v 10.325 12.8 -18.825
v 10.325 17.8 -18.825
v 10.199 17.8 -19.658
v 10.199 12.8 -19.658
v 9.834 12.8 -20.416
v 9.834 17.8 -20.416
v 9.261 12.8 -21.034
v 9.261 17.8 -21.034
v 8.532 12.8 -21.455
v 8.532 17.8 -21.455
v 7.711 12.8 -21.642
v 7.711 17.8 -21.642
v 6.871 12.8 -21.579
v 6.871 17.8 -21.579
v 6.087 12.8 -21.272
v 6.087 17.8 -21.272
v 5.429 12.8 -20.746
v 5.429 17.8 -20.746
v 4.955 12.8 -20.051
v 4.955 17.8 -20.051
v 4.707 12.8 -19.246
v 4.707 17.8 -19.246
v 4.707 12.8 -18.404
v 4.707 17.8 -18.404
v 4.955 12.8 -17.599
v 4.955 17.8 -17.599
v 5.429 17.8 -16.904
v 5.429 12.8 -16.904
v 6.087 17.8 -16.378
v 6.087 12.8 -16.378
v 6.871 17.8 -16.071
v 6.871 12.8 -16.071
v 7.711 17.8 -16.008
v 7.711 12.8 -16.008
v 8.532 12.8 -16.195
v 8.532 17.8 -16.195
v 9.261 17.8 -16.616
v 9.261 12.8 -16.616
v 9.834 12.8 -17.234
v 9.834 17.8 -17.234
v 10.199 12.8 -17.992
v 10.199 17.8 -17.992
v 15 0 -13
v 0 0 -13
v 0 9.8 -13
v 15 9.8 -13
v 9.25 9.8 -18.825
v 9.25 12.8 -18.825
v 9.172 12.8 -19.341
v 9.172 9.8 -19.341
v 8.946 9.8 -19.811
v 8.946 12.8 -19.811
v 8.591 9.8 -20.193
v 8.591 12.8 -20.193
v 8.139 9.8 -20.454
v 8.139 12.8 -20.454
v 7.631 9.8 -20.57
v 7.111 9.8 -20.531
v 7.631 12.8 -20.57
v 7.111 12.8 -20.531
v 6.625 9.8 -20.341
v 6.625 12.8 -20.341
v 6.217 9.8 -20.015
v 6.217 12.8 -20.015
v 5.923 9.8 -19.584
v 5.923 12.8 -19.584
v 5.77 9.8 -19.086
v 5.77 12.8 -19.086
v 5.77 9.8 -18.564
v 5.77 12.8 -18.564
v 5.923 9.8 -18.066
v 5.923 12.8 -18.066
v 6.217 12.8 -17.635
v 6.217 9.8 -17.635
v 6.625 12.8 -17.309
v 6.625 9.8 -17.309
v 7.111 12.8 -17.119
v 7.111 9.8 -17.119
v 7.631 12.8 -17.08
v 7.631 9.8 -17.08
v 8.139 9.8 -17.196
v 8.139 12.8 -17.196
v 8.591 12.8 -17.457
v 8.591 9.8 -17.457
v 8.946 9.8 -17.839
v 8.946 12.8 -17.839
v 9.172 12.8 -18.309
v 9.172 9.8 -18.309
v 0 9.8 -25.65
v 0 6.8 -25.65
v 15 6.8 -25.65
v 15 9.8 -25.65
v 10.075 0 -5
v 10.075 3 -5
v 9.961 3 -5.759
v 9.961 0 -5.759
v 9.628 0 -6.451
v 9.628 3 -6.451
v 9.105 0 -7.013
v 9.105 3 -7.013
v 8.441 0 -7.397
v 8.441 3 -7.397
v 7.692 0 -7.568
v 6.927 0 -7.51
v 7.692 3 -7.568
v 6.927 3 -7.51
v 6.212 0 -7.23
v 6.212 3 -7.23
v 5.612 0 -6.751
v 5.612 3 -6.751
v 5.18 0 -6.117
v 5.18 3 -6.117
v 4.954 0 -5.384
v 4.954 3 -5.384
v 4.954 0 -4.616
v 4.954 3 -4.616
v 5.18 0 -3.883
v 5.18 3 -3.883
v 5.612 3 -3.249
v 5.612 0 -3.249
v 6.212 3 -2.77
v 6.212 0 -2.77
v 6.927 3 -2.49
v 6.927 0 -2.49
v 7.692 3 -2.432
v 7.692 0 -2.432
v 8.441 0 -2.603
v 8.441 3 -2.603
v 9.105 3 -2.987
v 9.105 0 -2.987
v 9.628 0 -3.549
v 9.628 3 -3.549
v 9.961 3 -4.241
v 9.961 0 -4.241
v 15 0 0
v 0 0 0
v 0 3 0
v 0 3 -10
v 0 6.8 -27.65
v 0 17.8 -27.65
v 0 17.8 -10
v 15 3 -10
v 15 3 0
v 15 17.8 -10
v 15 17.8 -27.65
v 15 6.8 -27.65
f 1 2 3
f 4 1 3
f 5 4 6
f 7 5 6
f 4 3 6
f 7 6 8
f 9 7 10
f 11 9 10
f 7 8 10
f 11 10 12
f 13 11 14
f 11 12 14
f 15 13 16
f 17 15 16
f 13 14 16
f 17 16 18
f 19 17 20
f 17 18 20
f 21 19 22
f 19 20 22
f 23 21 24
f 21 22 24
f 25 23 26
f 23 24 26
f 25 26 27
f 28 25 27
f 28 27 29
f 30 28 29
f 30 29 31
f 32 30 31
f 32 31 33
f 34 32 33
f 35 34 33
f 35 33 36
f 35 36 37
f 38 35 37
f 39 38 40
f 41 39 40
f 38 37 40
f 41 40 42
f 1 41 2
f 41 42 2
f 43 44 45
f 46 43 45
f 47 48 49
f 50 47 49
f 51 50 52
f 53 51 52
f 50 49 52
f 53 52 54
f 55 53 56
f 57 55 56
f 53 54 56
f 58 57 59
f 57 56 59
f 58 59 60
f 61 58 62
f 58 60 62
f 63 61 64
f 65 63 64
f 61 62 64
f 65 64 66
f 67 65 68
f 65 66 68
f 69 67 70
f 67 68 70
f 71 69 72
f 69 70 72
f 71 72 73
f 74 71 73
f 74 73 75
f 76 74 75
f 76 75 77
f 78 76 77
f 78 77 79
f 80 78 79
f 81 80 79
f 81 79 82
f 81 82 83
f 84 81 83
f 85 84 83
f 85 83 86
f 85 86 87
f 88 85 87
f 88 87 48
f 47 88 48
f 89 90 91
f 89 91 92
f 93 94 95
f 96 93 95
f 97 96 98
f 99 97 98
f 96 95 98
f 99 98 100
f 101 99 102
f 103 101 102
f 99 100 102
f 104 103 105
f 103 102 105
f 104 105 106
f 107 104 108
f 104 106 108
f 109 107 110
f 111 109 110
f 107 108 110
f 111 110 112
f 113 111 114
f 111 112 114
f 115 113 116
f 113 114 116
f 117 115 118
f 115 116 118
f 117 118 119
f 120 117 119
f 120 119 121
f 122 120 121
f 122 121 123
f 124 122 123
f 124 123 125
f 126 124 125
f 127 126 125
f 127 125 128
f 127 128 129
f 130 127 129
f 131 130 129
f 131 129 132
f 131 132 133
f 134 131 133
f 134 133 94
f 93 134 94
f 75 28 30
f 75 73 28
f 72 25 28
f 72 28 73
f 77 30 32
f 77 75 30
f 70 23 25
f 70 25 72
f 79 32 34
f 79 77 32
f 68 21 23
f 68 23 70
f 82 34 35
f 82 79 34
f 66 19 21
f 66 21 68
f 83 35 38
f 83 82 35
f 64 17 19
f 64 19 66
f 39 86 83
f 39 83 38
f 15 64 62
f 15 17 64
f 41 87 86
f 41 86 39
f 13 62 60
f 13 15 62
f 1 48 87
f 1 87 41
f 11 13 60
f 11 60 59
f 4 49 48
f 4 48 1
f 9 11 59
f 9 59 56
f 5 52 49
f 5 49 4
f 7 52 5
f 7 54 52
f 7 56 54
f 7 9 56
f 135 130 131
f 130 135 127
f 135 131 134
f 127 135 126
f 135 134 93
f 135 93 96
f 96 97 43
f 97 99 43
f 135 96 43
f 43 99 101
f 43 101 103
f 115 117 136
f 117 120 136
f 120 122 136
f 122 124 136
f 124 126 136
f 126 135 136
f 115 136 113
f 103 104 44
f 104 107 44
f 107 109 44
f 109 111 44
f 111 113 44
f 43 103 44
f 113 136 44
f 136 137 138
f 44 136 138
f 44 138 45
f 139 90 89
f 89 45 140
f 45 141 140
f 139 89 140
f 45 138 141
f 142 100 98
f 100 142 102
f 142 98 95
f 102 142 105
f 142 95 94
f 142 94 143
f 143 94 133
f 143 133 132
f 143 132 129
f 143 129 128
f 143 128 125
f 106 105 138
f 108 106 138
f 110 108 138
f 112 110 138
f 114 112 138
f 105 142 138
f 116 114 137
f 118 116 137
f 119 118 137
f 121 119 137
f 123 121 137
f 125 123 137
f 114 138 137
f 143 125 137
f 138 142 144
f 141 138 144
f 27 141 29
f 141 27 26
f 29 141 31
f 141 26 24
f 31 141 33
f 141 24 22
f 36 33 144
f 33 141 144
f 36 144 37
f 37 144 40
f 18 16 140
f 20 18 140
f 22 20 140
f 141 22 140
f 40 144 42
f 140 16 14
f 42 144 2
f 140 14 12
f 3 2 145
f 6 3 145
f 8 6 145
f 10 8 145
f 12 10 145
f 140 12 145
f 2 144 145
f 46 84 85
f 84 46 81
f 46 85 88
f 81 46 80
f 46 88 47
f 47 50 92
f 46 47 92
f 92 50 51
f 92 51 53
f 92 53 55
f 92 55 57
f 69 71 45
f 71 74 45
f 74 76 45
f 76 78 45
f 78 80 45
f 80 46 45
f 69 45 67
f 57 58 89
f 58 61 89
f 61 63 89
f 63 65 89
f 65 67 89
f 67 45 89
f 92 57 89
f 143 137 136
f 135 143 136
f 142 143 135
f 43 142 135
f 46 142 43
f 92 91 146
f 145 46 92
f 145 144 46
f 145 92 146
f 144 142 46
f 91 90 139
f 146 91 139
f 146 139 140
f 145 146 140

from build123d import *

# Parameters (mm, degrees)
SALIENTE_EXTRUIR1_DEPTH = 15
CROQUIS4_W              = 2
CROQUIS4_H              = 6
SALIENTE_EXTRUIR2_DEPTH = 15
CROQUIS5_R              = 2.575
CORTAR_EXTRUIR1_DEPTH   = 4
CROQUIS6_W              = 17.65
CROQUIS6_H              = 5
SALIENTE_EXTRUIR3_DEPTH = 15
CROQUIS7_R              = 2.825
CORTAR_EXTRUIR2_DEPTH   = 5
CROQUIS8_R              = 1.75
CORTAR_EXTRUIR3_DEPTH   = 13.8


with BuildPart() as part:
    # Croquis2 → Saliente-Extruir1 (new body)
    with BuildSketch(Plane(origin=(0, 0, 0), x_dir=(0, 0, -1), z_dir=(1, 0, 0))):
        Polygon((0, 0), (13, 0), (13, 9.8), (25.65, 9.8), (25.65, 12.8), (10, 12.8), (10, 3), (0, 3), align=None)
    extrude(amount=SALIENTE_EXTRUIR1_DEPTH)

    # Croquis4 → Saliente-Extruir2 (add, through all)
    with BuildSketch(Plane(origin=(0, 0, 0), x_dir=(0, 0, -1), z_dir=(1, 0, 0))):
        with Locations((26.65, 9.8)):
            Rectangle(CROQUIS4_W, CROQUIS4_H)
    extrude(amount=SALIENTE_EXTRUIR2_DEPTH)

    # Croquis5 → Cortar-Extruir1 (cut, through all)
    with BuildSketch(Plane(origin=(0, 3, 0), x_dir=(1, 0, 0), z_dir=(0, 1, 0))):
        with Locations((7.5, 5)):
            Circle(CROQUIS5_R)
    extrude(amount=-CORTAR_EXTRUIR1_DEPTH, mode=Mode.SUBTRACT)

    # Croquis6 → Saliente-Extruir3 (add)
    with BuildSketch(Plane(origin=(15, 0, 0), x_dir=(0, 0, -1), z_dir=(1, 0, 0))):
        with Locations((18.825, 15.3)):
            Rectangle(CROQUIS6_W, CROQUIS6_H)
    extrude(amount=-SALIENTE_EXTRUIR3_DEPTH)

    # Croquis7 → Cortar-Extruir2 (cut)
    with BuildSketch(Plane(origin=(0, 17.8, 0), x_dir=(1, 0, 0), z_dir=(0, 1, 0))):
        with Locations((7.5, 18.825)):
            Circle(CROQUIS7_R)
    extrude(amount=-CORTAR_EXTRUIR2_DEPTH, mode=Mode.SUBTRACT)

    # Croquis8 → Cortar-Extruir3 (cut, through all)
    with BuildSketch(Plane(origin=(0, 12.8, 0), x_dir=(1, 0, 0), z_dir=(0, 1, 0))):
        with Locations((7.5, 18.825)):
            Circle(CROQUIS8_R)
    extrude(amount=-CORTAR_EXTRUIR3_DEPTH, mode=Mode.SUBTRACT)


solid = part.part
